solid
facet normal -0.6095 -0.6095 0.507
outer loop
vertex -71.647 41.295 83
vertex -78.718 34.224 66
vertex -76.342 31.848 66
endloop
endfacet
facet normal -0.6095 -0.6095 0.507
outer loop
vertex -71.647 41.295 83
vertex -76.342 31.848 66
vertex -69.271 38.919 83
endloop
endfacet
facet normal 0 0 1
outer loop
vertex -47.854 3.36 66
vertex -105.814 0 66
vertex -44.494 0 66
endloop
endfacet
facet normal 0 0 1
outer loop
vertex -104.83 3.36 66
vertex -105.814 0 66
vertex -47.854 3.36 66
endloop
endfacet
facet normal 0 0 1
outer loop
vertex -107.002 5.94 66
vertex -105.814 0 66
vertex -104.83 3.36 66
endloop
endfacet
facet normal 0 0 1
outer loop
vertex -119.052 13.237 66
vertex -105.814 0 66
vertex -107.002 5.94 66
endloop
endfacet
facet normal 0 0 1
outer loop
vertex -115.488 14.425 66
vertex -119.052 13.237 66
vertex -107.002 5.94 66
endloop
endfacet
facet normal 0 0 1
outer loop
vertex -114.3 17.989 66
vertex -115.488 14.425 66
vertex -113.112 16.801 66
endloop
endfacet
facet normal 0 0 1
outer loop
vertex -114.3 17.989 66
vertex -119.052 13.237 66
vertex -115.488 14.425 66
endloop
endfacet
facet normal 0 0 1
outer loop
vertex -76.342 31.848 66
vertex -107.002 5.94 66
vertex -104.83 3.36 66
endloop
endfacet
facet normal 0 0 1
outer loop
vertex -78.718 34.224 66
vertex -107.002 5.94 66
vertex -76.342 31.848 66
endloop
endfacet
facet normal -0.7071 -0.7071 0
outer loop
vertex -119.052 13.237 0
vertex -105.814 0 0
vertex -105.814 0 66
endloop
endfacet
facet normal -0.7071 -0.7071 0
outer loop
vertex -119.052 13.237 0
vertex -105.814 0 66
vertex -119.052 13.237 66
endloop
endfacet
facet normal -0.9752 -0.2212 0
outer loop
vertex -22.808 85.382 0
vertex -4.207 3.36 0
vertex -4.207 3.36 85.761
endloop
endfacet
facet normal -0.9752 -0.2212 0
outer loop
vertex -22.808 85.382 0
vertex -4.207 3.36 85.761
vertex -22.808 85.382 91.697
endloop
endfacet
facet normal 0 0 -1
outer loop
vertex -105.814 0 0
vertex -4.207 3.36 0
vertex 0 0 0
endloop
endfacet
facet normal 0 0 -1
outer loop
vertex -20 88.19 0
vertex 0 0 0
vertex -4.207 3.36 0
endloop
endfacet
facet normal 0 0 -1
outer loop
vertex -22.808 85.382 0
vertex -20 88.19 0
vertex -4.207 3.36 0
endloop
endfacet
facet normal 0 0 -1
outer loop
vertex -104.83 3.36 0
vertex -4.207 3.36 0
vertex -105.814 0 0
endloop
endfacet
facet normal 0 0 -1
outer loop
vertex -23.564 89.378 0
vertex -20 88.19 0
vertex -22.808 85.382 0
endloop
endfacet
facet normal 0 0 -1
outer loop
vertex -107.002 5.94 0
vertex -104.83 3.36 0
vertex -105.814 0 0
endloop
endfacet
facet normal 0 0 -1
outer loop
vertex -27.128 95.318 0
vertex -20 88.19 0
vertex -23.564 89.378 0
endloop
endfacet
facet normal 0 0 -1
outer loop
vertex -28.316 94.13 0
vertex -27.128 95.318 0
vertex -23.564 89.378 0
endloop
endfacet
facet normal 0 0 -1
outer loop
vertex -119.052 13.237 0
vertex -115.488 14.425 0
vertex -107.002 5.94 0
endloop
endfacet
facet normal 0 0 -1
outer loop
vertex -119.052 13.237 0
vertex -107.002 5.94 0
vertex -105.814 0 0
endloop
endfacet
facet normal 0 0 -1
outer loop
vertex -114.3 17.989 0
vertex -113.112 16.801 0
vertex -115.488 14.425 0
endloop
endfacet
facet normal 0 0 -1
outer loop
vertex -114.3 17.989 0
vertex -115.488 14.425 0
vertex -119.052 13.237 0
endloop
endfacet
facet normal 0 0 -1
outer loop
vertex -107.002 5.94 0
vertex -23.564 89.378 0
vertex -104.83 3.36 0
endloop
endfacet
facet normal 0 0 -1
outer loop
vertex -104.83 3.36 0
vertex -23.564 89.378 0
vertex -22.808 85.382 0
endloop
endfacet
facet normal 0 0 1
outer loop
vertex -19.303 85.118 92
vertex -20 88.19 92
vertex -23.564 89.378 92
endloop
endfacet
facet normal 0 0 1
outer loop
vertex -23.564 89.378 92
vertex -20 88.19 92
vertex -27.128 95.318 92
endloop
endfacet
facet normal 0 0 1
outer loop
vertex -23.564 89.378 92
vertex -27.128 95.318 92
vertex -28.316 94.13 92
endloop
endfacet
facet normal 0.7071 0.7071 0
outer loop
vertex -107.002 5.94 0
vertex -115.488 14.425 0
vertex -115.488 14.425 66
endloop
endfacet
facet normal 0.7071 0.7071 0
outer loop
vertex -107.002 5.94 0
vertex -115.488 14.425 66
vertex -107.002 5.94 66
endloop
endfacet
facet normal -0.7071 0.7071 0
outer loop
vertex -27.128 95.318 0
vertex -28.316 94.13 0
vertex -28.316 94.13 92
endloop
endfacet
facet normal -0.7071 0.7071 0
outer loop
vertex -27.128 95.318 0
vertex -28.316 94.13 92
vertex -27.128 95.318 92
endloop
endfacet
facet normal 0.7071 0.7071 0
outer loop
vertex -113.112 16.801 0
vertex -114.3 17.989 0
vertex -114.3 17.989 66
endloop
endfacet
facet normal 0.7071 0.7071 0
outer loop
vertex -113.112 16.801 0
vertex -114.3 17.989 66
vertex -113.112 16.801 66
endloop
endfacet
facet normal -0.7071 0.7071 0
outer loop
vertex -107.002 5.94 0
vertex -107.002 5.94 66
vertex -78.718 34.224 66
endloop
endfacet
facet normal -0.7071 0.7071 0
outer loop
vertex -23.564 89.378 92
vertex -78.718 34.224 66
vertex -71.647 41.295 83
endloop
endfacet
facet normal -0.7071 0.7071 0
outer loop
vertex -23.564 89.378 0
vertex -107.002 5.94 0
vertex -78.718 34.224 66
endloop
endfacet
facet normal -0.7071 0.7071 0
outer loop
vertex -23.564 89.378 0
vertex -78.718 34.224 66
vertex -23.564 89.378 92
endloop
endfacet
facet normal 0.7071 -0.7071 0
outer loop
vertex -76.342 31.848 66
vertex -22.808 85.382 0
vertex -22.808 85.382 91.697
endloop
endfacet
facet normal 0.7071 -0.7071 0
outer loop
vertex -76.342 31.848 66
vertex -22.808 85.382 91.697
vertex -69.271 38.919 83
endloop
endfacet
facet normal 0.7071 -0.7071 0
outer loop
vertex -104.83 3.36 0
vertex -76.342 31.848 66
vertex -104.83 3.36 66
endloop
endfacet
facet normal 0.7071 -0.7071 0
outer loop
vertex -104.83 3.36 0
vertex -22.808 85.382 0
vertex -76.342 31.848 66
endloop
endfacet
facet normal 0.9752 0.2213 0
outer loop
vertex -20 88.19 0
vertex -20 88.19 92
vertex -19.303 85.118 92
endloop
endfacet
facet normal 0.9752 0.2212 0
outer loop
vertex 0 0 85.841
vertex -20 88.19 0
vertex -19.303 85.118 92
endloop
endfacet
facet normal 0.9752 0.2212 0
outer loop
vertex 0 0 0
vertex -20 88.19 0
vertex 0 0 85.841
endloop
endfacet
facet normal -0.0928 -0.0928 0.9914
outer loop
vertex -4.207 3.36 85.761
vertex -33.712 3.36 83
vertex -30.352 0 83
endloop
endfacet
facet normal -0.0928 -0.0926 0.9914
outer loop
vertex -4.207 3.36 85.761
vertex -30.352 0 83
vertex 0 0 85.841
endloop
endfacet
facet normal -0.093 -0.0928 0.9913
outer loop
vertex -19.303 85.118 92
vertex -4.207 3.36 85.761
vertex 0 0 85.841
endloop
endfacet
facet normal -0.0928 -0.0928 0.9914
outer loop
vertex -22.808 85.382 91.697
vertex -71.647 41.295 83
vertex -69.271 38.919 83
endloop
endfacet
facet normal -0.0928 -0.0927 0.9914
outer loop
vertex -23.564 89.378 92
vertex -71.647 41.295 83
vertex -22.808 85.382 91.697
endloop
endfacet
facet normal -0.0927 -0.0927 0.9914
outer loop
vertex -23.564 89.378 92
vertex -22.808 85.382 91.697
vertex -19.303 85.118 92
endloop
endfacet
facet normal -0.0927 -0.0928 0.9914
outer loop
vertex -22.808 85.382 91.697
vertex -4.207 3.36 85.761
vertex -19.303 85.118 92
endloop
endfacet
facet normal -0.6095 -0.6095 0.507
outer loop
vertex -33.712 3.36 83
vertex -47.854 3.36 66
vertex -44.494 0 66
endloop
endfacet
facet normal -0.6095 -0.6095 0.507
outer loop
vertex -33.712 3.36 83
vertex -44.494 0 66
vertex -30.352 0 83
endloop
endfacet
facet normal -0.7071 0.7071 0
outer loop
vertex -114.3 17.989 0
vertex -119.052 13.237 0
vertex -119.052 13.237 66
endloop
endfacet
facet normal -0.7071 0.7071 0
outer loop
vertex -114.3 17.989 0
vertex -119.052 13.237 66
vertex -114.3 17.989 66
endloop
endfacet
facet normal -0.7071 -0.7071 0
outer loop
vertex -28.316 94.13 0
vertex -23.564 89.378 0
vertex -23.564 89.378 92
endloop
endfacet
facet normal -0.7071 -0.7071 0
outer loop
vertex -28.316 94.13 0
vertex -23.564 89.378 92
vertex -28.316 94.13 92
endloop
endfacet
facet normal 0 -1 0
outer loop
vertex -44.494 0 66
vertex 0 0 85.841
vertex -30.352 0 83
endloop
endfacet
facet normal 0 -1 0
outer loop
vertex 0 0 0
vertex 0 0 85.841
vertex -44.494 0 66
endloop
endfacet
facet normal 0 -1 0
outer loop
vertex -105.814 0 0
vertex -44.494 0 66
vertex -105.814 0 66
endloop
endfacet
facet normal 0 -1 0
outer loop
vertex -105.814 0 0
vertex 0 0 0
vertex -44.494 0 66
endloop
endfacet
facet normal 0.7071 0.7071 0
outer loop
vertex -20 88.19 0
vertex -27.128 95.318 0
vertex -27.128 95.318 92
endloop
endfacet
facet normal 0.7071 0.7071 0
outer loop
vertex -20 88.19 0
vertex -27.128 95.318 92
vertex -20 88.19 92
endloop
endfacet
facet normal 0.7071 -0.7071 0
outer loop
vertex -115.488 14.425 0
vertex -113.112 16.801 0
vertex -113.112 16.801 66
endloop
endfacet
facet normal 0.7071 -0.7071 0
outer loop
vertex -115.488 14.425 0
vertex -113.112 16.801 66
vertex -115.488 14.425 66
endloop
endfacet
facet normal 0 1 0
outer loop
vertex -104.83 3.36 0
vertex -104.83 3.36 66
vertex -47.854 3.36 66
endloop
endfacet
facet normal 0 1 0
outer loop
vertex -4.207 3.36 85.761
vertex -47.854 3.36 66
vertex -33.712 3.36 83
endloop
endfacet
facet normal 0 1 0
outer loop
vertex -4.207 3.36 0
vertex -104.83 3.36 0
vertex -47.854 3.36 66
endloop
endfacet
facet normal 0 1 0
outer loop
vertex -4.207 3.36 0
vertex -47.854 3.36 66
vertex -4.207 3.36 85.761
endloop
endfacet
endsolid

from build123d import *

# Parameters (mm, degrees)
PAD_DEPTH    = 92
POCKET_DEPTH = 100


with BuildPart() as part:
    # Sketch → Pad (new body)
    with BuildSketch(Plane.XY):
        Polygon((-107.002418, 5.939697), (-23.563818, 89.378297), (-28.315576, 94.130055), (-27.127636, 95.317994), (-20, 88.190358), (0, 0), (-105.814479, 0), (-119.051518, 13.237039), (-114.29976, 17.988797), (-113.111821, 16.800857), (-115.4877, 14.424978), align=None)
        Polygon((-22.80842, 85.381938), (-104.830358, 3.36), (-4.207307, 3.36), align=None, mode=Mode.SUBTRACT)
    extrude(amount=PAD_DEPTH)

    # Sketch001 (on Face1 of Pad) → Pocket (cut, symmetric)
    with BuildSketch(Plane(origin=(-56.471058, 56.471058, 0), x_dir=(-0.707107, -0.707107, 0), z_dir=(-0.707107, 0.707107, 0))):
        Polygon((85.037769, 66), (31.462136, 66), (21.462136, 83), (-46.537864, 92), (-46.537864, 107.253265), (85.037769, 107.253265), align=None)
    extrude(amount=POCKET_DEPTH, both=True, mode=Mode.SUBTRACT)


solid = part.part
